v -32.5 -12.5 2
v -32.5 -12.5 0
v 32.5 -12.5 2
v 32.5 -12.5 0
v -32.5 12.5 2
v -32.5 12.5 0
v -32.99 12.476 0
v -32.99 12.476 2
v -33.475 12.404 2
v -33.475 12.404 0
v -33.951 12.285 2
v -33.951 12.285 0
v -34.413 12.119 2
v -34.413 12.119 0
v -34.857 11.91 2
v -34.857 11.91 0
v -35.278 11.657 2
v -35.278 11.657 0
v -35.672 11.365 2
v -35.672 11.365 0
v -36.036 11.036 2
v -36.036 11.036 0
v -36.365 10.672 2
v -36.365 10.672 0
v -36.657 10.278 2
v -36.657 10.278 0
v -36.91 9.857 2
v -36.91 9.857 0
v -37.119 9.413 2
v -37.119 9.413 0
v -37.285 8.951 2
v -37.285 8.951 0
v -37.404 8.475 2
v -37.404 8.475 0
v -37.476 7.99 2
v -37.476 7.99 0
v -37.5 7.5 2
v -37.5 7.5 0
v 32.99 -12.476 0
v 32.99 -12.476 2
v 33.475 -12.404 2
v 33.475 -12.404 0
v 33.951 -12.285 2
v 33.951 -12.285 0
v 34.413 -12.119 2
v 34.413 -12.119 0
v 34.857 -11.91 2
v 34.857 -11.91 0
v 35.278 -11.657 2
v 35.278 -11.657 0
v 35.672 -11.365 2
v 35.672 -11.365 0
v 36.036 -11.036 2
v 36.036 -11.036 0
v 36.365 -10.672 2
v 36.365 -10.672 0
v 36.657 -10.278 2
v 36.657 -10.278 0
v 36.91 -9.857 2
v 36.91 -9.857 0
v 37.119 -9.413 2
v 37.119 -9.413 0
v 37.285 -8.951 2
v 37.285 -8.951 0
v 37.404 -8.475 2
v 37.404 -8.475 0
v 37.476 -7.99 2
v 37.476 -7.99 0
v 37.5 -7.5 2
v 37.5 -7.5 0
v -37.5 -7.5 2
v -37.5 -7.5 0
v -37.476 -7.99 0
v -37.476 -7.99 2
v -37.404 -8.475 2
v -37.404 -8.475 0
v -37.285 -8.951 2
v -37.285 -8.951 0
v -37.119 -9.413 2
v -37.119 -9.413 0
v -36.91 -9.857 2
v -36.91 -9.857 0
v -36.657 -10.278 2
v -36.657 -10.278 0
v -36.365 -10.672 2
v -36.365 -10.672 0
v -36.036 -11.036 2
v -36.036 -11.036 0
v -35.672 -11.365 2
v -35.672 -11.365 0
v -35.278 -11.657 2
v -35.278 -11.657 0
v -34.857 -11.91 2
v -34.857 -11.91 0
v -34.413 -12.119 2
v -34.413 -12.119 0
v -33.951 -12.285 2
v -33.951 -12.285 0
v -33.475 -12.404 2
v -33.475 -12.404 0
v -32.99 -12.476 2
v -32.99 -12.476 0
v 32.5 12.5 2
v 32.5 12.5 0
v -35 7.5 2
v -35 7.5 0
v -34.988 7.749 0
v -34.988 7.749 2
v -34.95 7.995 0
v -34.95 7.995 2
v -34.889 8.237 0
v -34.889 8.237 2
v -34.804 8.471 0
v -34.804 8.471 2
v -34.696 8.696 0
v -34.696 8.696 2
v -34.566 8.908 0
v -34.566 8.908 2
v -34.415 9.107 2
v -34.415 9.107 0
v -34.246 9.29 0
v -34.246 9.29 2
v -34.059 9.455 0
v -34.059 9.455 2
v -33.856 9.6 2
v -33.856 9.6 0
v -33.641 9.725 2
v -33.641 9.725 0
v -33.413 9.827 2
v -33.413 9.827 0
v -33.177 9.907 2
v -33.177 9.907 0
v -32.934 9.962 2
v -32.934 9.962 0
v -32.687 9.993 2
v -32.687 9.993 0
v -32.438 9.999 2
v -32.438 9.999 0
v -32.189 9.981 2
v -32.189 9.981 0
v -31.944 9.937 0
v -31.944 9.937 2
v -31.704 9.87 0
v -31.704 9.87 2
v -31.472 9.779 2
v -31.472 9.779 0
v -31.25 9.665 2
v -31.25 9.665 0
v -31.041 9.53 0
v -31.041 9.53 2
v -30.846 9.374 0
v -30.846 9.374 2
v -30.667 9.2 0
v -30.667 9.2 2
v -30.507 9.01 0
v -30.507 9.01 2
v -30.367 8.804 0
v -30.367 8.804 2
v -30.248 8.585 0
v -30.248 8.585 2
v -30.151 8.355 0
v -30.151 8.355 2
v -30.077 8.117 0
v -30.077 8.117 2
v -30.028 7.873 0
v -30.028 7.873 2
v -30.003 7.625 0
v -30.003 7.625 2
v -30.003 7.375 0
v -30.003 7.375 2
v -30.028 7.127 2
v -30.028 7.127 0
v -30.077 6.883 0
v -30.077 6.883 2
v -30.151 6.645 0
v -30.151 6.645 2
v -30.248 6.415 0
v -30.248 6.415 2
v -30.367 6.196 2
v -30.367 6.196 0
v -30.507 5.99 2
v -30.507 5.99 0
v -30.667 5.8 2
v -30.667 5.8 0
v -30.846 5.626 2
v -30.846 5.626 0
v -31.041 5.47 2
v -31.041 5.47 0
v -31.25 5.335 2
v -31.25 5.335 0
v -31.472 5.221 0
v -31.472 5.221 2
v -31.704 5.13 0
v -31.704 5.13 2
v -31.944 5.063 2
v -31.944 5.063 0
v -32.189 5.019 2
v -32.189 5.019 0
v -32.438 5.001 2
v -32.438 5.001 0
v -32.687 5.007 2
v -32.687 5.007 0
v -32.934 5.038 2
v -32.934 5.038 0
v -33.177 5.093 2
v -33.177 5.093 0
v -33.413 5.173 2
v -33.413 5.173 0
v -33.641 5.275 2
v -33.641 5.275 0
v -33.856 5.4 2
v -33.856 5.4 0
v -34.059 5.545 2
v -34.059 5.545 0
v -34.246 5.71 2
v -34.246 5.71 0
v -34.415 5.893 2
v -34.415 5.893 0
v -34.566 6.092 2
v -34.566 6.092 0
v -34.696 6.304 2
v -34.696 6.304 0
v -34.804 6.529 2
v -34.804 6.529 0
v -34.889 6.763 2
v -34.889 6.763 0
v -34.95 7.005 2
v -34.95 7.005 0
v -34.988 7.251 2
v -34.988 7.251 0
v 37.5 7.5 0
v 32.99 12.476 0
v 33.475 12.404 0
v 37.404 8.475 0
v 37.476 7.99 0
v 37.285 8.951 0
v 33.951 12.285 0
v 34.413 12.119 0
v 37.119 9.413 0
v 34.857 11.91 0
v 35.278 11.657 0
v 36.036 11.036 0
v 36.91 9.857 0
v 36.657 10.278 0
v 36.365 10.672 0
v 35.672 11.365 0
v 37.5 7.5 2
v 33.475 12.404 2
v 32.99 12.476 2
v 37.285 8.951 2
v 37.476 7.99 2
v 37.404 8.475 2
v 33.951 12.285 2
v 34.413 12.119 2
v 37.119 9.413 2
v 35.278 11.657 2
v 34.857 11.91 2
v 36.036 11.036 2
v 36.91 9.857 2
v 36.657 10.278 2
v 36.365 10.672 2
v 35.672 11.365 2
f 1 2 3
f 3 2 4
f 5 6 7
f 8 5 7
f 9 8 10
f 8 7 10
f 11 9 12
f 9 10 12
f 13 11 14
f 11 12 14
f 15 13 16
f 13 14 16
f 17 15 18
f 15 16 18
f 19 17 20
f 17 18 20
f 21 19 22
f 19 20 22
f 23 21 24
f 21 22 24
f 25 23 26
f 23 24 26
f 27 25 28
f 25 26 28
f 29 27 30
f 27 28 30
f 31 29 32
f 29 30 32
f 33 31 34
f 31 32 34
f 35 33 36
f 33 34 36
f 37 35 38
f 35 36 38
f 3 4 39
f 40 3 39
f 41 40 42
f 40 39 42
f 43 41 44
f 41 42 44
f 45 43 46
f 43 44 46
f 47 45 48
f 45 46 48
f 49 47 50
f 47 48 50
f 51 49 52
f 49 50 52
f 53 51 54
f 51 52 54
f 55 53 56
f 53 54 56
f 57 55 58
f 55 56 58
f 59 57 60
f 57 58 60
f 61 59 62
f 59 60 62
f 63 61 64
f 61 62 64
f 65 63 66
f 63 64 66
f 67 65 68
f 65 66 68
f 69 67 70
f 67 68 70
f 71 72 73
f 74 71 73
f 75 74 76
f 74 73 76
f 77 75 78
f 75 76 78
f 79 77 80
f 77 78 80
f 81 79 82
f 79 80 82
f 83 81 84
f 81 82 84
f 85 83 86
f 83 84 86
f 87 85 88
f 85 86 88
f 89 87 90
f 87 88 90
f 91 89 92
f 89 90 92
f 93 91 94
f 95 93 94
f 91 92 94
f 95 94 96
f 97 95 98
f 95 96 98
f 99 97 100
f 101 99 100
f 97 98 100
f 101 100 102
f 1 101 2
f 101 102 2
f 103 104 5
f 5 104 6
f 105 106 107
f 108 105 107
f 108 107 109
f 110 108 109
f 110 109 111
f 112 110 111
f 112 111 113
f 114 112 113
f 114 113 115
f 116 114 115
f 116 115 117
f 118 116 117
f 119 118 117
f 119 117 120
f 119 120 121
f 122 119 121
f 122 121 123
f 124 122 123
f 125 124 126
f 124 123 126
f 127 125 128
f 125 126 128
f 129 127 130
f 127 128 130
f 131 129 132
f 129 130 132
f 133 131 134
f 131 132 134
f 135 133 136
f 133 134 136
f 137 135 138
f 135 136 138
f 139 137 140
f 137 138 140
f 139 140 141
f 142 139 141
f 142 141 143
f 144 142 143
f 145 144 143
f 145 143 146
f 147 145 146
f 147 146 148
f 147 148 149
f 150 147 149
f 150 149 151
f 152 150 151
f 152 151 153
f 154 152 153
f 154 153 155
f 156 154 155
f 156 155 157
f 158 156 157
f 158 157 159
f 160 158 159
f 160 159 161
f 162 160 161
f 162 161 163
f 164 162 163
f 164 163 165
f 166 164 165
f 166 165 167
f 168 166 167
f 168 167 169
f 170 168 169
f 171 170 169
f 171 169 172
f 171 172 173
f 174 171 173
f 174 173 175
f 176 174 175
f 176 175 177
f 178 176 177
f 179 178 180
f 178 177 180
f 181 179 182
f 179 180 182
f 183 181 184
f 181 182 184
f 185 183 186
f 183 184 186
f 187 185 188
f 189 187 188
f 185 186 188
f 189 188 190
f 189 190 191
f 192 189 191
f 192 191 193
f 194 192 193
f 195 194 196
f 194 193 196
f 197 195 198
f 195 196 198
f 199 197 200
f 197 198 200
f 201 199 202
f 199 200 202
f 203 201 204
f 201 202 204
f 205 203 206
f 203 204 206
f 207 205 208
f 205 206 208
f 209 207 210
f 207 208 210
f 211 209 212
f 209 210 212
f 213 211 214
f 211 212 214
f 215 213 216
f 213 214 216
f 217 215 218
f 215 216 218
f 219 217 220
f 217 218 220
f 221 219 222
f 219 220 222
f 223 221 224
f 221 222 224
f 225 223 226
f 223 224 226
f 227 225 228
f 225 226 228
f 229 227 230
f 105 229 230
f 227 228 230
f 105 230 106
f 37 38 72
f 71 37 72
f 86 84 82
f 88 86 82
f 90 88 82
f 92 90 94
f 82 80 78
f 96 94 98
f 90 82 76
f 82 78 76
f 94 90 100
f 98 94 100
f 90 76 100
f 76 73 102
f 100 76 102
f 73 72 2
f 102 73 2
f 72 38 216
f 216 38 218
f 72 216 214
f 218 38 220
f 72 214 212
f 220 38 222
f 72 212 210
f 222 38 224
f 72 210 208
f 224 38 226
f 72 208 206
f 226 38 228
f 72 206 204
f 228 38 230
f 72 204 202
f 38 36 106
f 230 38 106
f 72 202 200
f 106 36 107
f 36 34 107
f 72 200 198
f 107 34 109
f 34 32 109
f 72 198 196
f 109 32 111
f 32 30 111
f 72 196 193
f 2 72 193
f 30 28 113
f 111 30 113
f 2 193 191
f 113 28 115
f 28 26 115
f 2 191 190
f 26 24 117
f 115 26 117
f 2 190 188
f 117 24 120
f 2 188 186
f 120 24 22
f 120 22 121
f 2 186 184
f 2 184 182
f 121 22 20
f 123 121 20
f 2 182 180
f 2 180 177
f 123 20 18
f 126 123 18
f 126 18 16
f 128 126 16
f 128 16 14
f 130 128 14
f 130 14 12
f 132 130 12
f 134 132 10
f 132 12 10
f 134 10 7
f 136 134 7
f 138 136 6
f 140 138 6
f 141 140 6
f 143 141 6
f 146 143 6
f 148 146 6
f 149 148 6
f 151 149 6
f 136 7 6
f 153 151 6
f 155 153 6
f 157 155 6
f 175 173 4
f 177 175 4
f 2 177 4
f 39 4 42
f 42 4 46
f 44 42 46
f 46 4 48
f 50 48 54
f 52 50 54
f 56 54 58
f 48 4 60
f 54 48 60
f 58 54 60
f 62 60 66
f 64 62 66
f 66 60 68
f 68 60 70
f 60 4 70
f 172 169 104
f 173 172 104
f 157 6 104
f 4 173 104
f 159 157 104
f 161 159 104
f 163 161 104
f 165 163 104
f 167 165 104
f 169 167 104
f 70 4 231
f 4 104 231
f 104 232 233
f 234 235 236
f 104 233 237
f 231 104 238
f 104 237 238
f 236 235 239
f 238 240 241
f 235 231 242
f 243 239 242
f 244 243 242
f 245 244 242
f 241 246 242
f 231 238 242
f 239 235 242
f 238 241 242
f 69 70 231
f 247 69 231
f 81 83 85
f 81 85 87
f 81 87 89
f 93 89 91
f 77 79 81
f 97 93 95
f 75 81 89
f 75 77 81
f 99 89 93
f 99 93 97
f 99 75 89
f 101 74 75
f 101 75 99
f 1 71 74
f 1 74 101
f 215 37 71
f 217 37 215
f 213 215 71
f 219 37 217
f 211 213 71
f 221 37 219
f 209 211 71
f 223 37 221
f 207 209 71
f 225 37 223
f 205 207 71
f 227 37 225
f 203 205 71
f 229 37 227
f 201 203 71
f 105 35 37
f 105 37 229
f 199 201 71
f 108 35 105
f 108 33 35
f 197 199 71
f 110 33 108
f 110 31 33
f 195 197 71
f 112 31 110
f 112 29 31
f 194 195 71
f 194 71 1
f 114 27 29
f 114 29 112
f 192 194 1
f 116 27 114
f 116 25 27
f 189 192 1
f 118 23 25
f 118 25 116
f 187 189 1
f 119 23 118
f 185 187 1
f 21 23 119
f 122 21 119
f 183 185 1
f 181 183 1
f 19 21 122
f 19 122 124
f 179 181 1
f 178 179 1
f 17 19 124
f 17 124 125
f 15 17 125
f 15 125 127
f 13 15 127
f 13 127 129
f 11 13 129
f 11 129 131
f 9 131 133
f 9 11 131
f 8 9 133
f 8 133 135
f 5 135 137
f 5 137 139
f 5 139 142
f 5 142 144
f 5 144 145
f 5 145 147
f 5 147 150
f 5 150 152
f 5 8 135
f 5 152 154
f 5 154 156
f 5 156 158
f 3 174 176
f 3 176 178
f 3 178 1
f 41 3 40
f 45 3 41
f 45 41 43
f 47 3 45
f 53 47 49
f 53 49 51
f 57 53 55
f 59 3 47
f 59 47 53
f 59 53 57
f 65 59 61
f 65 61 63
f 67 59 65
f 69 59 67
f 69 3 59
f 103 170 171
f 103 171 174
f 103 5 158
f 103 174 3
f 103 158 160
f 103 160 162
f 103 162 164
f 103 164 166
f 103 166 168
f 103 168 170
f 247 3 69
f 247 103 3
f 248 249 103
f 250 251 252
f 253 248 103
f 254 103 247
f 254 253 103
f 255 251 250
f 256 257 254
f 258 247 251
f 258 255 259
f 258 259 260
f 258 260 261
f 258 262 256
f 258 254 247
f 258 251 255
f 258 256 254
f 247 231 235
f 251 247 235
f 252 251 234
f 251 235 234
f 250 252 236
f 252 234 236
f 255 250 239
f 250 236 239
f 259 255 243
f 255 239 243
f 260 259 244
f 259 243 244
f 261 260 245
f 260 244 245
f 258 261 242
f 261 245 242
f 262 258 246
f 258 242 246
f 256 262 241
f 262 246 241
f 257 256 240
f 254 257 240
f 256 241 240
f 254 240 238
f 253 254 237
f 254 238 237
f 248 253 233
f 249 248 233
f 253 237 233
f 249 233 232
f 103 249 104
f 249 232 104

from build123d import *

# Parameters (mm, degrees)
F1_DEPTH = 2
F3_D     = 5


with BuildPart() as f1:
    # F0 (on Top) → F1 (new body)
    with BuildSketch(Plane.XY):
        with BuildLine():
            ThreePointArc((37.5, 7.5), (36.035534, 11.035534), (32.5, 12.5))
            Line((32.5, 12.5), (-32.5, 12.5))
            ThreePointArc((-32.5, 12.5), (-36.035534, 11.035534), (-37.5, 7.5))
            Line((-37.5, 7.5), (-37.5, -7.5))
            ThreePointArc((-37.5, -7.5), (-36.035534, -11.035534), (-32.5, -12.5))
            Line((-32.5, -12.5), (32.5, -12.5))
            ThreePointArc((32.5, -12.5), (36.035534, -11.035534), (37.5, -7.5))
            Line((37.5, -7.5), (37.5, 7.5))
        make_face()
    extrude(amount=F1_DEPTH)

    # F3 (through all)
    with Locations(Plane.XY.offset(2)):
        with Locations((-32.5, 7.5)):
            Hole(F3_D / 2)


solid = f1.part
